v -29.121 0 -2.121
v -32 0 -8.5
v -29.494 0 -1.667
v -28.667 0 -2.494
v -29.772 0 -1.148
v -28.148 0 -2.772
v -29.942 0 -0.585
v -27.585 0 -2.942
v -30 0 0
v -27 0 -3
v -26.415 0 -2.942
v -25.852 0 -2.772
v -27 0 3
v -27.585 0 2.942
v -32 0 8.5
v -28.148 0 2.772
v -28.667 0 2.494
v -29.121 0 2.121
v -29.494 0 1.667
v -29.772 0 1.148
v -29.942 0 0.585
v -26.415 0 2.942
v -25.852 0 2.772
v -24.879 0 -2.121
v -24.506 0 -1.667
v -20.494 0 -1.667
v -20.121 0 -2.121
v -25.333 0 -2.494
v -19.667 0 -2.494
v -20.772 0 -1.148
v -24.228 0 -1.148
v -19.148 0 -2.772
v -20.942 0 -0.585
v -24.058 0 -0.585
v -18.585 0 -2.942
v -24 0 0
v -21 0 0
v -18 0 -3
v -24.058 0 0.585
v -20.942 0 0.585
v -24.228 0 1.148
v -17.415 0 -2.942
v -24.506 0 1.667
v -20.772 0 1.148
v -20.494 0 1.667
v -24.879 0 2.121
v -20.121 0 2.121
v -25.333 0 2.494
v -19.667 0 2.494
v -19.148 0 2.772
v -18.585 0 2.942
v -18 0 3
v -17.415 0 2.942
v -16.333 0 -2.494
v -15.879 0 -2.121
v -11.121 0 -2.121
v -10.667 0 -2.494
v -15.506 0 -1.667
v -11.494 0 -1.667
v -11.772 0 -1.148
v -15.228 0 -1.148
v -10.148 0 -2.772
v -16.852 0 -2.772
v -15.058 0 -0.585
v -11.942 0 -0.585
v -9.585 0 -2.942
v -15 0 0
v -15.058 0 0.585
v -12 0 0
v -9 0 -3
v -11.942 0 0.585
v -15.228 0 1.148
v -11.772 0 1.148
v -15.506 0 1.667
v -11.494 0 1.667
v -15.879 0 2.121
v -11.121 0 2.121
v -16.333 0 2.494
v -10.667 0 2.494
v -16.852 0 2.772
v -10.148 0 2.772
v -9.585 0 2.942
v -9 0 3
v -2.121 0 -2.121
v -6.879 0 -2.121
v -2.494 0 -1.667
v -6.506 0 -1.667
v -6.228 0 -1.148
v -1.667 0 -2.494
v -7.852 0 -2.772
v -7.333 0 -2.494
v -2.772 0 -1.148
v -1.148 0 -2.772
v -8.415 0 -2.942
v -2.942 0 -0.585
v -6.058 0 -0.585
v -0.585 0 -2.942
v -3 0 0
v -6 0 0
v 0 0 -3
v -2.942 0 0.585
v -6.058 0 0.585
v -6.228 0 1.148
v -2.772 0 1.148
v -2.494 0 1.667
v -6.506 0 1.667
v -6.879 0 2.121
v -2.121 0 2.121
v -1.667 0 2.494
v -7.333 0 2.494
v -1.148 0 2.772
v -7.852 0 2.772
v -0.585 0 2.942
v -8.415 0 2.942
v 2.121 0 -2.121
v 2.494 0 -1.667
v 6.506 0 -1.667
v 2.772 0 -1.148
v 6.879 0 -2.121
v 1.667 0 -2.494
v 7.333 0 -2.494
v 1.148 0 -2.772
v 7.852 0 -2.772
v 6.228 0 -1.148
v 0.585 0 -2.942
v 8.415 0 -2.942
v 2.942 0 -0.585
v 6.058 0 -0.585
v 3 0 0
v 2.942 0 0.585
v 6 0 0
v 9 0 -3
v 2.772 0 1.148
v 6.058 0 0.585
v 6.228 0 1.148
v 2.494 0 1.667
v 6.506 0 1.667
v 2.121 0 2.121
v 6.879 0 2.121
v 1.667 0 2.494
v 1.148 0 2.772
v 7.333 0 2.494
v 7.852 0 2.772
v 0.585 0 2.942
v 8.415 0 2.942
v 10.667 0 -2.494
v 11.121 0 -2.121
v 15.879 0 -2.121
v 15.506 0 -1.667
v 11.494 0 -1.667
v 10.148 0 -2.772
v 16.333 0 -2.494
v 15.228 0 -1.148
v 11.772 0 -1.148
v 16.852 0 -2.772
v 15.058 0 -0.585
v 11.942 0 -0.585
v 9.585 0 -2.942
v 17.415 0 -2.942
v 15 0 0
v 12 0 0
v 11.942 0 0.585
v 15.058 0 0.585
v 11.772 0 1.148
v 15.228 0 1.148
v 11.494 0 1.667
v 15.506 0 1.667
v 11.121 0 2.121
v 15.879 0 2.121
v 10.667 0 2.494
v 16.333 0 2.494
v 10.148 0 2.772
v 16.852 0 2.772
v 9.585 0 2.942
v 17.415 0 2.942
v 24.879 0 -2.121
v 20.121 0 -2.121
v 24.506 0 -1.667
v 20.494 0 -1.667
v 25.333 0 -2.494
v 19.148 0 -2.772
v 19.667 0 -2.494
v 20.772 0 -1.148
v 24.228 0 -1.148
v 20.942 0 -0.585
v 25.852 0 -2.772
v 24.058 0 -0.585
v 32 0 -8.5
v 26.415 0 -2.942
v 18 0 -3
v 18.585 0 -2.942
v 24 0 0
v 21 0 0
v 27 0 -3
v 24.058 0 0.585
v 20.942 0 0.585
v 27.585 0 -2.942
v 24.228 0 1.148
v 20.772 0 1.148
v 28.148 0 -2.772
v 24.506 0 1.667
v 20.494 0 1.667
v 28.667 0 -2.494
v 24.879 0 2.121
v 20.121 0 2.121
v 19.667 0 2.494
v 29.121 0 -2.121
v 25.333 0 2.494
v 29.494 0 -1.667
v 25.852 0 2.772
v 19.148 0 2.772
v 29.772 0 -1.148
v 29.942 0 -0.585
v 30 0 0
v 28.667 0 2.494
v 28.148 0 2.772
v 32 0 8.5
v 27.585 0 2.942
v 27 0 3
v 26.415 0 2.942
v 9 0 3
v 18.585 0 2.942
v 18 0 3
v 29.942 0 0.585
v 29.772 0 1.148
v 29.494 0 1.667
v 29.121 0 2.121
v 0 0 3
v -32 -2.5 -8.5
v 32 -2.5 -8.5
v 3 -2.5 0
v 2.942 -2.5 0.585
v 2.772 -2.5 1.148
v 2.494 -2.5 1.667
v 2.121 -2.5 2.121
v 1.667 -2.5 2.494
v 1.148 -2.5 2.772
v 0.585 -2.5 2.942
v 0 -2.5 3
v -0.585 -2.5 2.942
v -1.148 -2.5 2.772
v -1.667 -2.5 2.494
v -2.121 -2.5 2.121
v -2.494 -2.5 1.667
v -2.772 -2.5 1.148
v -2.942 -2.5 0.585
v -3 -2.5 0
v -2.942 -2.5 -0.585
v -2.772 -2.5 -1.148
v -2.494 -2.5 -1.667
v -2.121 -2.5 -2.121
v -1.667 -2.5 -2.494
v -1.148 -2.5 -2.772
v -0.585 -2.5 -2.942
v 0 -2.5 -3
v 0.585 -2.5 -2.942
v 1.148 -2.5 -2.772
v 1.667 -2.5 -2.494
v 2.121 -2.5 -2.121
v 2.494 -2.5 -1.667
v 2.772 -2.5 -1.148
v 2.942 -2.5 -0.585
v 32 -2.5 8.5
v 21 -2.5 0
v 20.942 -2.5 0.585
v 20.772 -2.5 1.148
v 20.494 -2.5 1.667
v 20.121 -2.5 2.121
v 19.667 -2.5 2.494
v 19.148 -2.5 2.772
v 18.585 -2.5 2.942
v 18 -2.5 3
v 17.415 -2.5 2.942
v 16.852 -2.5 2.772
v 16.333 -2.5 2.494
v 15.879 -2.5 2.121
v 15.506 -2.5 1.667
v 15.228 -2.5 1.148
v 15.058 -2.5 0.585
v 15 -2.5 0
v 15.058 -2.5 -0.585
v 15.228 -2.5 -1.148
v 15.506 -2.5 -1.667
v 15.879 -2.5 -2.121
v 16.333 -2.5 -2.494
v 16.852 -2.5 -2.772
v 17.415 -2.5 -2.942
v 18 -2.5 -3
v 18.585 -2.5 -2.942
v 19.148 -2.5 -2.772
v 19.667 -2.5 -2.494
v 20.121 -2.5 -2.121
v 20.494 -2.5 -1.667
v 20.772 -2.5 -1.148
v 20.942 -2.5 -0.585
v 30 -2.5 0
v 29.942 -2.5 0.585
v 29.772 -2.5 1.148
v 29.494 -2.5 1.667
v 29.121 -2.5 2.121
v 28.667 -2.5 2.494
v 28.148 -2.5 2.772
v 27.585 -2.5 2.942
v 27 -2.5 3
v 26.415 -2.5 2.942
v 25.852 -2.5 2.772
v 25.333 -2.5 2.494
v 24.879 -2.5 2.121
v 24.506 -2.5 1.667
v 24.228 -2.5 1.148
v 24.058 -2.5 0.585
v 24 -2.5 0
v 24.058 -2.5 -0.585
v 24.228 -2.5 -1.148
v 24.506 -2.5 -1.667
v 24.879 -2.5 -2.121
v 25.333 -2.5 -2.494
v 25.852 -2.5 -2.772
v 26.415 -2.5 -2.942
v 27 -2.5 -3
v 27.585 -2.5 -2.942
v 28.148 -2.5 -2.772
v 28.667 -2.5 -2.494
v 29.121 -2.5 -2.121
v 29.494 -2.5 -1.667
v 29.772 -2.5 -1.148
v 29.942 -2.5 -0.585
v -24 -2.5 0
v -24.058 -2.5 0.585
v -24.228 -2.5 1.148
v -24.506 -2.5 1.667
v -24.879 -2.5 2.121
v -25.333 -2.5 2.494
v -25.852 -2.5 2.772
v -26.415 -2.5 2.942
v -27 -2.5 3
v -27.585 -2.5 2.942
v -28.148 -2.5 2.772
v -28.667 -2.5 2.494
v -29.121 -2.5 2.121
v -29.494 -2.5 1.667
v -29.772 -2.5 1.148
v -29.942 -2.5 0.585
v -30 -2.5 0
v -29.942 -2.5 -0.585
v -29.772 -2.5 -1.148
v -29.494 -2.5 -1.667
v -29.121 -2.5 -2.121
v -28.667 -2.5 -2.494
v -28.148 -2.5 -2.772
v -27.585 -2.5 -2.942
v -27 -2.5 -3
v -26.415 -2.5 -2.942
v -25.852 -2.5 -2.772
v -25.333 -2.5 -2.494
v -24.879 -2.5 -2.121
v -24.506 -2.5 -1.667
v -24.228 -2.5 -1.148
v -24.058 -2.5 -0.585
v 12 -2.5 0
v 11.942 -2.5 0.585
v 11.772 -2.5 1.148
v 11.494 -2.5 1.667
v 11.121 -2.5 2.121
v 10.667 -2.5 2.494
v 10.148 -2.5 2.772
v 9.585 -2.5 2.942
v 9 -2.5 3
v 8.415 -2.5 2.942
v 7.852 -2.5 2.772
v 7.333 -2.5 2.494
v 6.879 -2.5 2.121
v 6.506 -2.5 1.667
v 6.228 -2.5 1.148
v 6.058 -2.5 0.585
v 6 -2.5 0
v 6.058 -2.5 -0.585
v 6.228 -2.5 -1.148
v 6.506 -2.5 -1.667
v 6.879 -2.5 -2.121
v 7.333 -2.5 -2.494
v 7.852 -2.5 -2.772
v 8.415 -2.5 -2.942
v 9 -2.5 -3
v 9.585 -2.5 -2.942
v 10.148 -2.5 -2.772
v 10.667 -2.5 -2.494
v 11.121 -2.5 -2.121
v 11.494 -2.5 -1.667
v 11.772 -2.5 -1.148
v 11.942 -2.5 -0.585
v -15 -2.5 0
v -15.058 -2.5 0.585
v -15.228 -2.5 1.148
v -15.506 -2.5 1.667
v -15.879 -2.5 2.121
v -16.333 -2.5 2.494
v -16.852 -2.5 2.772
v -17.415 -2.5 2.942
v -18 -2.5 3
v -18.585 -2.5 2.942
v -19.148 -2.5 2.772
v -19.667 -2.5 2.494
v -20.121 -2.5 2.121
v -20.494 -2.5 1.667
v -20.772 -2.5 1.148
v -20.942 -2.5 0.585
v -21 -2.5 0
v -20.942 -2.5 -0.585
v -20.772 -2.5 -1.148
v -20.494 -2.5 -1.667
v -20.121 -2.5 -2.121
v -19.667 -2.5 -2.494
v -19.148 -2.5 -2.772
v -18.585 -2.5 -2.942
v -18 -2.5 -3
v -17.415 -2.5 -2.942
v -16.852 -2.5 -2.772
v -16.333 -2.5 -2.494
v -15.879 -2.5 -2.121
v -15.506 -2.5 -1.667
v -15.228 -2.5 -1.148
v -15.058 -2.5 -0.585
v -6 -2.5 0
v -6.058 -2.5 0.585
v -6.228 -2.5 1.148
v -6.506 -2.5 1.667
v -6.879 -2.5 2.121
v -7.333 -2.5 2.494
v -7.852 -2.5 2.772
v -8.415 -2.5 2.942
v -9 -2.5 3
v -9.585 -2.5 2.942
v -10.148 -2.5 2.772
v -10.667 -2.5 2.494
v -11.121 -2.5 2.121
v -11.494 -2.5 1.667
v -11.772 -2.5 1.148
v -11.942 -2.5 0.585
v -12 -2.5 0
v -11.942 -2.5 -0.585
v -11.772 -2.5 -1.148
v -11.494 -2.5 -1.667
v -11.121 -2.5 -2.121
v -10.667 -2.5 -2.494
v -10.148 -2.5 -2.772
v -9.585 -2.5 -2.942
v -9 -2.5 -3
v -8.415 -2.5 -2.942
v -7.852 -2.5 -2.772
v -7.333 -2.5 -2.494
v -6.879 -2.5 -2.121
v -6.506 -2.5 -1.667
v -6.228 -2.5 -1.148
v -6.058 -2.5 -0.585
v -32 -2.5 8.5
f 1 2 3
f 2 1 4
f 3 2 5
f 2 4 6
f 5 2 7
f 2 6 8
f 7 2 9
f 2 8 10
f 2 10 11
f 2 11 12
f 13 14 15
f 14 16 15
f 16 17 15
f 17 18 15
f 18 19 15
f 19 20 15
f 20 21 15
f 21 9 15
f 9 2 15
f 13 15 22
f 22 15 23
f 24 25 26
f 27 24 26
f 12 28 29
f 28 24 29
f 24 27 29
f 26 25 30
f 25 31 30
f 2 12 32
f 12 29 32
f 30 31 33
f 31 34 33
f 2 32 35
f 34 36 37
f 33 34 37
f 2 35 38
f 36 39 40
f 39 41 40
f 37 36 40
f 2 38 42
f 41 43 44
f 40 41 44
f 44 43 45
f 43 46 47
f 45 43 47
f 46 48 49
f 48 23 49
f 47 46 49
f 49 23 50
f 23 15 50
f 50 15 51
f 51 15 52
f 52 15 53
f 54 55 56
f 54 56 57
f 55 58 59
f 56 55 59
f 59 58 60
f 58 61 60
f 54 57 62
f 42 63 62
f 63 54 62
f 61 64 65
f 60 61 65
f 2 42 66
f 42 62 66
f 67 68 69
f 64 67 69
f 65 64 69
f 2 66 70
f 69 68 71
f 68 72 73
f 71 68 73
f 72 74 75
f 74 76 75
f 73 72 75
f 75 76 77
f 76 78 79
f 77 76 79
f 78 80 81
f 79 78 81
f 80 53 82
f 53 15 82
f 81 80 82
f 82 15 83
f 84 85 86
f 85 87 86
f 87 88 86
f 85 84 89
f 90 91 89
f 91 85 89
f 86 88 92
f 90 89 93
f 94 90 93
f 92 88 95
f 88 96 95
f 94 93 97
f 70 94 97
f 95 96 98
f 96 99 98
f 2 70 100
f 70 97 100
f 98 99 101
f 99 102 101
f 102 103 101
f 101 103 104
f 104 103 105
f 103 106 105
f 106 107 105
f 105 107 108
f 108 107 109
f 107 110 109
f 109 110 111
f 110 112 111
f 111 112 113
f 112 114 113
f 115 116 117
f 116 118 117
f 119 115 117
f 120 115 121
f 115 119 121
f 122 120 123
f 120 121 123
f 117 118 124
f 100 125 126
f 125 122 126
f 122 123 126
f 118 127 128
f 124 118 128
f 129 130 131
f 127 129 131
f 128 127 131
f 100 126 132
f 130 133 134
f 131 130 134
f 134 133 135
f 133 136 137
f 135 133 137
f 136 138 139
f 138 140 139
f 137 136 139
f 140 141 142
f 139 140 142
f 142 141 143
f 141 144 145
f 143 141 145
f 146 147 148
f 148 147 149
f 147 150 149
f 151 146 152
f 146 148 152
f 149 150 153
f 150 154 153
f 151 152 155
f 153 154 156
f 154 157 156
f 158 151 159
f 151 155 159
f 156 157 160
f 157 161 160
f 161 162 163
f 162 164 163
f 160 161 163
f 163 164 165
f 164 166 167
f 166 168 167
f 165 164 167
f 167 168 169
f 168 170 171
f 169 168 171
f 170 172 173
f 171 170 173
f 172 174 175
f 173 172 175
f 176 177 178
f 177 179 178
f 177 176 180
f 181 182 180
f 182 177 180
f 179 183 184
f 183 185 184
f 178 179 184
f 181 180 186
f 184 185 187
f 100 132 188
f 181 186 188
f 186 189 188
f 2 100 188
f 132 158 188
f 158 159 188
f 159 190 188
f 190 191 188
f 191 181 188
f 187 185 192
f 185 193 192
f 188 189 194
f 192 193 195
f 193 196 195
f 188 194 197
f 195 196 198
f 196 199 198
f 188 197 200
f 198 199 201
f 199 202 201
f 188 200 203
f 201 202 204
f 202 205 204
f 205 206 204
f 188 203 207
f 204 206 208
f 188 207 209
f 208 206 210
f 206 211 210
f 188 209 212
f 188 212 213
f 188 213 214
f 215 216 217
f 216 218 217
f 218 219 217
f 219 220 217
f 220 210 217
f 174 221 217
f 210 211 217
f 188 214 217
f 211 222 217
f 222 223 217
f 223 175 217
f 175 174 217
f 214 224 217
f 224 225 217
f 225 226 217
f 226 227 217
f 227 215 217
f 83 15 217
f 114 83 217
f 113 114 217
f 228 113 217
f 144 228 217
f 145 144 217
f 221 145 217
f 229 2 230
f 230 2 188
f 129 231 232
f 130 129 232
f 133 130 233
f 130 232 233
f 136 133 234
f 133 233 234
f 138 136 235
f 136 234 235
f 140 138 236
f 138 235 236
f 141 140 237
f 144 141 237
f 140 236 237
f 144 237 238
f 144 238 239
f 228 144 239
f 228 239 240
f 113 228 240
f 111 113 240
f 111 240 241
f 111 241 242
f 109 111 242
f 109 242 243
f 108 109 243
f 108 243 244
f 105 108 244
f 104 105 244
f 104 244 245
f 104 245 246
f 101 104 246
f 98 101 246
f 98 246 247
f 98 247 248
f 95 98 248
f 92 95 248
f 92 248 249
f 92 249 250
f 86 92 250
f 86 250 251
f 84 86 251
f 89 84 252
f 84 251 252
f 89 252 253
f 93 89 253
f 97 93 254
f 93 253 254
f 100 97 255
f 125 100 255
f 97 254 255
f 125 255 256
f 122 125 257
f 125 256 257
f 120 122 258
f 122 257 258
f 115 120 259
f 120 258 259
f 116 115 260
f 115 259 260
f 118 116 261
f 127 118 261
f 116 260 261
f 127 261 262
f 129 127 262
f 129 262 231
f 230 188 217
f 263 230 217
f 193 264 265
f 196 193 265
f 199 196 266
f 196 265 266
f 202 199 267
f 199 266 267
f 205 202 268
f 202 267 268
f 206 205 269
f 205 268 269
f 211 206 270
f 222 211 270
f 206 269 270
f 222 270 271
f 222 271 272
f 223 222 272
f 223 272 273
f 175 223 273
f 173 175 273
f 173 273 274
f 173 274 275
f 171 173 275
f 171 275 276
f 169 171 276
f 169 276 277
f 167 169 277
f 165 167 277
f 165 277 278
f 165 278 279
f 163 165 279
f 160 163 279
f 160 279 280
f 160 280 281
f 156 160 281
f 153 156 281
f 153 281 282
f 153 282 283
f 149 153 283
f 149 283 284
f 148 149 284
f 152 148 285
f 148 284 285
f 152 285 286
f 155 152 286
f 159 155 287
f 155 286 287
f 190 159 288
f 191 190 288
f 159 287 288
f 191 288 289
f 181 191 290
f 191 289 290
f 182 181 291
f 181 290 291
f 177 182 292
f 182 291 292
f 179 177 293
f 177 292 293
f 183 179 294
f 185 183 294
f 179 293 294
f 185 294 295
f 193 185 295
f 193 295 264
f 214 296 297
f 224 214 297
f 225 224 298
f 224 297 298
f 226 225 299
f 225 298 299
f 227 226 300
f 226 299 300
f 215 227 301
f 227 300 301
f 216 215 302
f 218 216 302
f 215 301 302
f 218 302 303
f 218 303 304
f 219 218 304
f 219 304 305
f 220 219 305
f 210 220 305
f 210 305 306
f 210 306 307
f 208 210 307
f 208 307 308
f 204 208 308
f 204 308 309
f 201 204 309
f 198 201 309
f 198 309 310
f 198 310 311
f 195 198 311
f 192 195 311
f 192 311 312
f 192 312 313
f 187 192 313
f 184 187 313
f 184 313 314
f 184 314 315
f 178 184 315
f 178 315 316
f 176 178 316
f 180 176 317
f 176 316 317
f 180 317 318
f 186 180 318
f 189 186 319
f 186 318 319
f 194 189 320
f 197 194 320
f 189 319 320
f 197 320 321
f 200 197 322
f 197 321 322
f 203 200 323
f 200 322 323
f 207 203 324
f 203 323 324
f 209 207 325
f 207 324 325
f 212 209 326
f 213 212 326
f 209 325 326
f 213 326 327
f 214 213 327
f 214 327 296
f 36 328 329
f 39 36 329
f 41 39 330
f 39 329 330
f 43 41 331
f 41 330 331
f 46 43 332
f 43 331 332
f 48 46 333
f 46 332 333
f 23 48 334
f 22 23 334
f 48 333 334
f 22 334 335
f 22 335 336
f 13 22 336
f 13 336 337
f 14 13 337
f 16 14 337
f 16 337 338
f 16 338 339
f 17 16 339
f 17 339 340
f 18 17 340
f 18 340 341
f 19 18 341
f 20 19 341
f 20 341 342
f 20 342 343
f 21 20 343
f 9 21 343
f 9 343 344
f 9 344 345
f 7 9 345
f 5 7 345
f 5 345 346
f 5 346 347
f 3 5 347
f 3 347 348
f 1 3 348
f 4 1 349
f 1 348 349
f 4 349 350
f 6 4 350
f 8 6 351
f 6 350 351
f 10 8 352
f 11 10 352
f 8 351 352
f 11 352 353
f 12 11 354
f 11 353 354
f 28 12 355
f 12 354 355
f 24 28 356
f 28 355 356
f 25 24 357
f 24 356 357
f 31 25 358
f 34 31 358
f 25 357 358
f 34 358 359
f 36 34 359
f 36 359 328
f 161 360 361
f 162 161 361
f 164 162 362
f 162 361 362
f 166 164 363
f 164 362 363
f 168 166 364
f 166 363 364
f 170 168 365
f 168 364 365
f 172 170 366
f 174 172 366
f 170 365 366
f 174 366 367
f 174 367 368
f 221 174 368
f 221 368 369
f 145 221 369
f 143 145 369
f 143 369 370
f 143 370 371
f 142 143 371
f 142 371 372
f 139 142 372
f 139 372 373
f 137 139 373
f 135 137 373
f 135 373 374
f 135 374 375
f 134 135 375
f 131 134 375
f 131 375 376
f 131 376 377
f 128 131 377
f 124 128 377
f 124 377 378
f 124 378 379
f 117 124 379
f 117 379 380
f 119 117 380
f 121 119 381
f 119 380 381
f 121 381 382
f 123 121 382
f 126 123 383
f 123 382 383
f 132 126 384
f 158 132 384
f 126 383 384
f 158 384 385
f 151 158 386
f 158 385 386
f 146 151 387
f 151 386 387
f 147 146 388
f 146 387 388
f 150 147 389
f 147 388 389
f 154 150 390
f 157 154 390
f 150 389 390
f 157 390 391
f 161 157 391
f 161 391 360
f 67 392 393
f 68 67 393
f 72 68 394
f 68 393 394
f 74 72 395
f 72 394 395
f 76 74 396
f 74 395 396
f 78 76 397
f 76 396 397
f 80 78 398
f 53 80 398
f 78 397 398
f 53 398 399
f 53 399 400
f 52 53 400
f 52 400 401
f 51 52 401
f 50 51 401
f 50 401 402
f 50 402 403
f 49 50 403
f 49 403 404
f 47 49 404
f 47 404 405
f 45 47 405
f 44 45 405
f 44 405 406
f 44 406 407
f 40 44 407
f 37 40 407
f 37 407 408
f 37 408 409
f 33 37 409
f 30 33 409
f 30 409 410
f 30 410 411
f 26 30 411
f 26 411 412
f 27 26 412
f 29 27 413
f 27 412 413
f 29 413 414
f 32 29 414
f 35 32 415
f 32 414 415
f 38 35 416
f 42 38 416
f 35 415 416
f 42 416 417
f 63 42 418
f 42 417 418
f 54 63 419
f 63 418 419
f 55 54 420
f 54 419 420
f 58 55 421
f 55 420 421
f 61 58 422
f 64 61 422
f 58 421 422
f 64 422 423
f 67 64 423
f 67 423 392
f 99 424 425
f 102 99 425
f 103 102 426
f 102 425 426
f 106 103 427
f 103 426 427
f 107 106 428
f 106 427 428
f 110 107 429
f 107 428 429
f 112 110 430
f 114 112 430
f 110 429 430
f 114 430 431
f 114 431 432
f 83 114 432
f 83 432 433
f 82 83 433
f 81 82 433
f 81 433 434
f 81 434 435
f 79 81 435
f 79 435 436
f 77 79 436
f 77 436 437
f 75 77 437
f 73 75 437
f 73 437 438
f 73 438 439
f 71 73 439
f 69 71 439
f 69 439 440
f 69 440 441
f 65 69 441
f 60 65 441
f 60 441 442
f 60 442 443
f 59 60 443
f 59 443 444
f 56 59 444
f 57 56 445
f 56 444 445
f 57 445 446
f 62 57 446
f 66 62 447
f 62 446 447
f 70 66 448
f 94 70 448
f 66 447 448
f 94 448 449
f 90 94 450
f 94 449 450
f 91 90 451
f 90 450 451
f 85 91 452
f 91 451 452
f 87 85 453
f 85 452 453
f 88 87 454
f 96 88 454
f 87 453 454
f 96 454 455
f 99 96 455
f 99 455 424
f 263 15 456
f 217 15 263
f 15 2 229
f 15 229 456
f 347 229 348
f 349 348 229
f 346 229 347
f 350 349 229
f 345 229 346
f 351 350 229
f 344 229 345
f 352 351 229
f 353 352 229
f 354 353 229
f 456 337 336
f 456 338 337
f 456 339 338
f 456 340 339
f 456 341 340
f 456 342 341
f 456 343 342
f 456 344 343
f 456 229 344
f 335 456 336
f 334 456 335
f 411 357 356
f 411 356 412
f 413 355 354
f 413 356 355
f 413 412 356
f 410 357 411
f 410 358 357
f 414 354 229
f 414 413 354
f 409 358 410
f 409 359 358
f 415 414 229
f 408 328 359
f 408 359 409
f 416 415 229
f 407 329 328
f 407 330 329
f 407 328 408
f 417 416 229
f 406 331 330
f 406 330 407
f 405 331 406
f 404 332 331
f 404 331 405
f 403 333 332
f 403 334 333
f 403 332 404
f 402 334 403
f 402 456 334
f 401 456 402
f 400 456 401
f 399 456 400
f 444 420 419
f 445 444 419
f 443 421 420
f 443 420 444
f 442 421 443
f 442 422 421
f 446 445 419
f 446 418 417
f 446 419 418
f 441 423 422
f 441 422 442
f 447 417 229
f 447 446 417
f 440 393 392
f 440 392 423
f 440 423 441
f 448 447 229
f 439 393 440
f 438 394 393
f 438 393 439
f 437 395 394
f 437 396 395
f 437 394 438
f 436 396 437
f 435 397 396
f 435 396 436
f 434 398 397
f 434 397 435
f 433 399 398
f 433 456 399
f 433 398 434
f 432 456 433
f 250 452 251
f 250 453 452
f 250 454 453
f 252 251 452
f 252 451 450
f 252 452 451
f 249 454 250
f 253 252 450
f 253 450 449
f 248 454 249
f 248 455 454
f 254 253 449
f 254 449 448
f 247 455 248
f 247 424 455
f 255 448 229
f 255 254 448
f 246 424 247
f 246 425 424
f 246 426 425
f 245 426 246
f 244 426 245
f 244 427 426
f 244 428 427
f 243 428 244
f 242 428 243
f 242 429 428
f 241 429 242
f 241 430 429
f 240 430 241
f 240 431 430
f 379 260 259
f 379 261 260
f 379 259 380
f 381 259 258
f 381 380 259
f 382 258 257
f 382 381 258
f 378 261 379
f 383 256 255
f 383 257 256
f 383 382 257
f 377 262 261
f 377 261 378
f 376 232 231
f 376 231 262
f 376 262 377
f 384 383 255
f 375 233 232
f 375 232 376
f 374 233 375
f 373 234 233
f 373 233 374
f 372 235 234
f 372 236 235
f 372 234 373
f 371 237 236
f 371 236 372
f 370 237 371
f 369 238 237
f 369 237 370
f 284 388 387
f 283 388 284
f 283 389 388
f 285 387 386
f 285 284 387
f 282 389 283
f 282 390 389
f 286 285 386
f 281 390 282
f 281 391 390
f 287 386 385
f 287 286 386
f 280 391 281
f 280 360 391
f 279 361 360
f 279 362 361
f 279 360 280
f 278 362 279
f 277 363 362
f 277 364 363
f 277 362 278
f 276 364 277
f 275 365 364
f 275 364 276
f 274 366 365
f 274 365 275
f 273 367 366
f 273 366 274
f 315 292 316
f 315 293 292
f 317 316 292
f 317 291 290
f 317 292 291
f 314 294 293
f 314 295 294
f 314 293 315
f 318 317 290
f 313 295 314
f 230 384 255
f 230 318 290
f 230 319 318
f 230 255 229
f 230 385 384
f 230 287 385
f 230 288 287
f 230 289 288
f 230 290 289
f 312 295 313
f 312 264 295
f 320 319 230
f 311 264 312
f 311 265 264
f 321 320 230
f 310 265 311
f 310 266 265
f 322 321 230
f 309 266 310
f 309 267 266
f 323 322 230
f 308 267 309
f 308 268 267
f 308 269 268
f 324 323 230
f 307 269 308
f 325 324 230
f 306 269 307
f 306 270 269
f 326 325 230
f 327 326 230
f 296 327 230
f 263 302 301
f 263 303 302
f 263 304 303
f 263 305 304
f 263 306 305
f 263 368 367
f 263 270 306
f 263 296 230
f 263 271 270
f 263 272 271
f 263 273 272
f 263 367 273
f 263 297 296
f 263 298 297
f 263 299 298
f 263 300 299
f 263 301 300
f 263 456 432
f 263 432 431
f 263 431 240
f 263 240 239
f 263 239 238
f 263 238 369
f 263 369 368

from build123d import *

# Parameters (mm, degrees)
F0_W     = 64
F0_H     = 17
F1_DEPTH = 2.5
F2_R     = 3
F3_DEPTH = 2.501


with BuildPart() as f1:
    # F0 (on Front) → F1 (new body)
    with BuildSketch(Plane.XZ):
        Rectangle(F0_W, F0_H)
    extrude(amount=F1_DEPTH)

    # F2 (on face) → F3 (cut, through all)
    with BuildSketch(Plane.XZ.offset(2.5)):
        with Locations((27, 0)):
            Circle(F2_R)
        with Locations((18, 0)):
            Circle(F2_R)
        with Locations((9, 0)):
            Circle(F2_R)
        Circle(F2_R)
        with Locations((-9, 0)):
            Circle(F2_R)
        with Locations((-18, 0)):
            Circle(F2_R)
        with Locations((-27, 0)):
            Circle(F2_R)
    extrude(amount=-F3_DEPTH, mode=Mode.SUBTRACT)


solid = f1.part
